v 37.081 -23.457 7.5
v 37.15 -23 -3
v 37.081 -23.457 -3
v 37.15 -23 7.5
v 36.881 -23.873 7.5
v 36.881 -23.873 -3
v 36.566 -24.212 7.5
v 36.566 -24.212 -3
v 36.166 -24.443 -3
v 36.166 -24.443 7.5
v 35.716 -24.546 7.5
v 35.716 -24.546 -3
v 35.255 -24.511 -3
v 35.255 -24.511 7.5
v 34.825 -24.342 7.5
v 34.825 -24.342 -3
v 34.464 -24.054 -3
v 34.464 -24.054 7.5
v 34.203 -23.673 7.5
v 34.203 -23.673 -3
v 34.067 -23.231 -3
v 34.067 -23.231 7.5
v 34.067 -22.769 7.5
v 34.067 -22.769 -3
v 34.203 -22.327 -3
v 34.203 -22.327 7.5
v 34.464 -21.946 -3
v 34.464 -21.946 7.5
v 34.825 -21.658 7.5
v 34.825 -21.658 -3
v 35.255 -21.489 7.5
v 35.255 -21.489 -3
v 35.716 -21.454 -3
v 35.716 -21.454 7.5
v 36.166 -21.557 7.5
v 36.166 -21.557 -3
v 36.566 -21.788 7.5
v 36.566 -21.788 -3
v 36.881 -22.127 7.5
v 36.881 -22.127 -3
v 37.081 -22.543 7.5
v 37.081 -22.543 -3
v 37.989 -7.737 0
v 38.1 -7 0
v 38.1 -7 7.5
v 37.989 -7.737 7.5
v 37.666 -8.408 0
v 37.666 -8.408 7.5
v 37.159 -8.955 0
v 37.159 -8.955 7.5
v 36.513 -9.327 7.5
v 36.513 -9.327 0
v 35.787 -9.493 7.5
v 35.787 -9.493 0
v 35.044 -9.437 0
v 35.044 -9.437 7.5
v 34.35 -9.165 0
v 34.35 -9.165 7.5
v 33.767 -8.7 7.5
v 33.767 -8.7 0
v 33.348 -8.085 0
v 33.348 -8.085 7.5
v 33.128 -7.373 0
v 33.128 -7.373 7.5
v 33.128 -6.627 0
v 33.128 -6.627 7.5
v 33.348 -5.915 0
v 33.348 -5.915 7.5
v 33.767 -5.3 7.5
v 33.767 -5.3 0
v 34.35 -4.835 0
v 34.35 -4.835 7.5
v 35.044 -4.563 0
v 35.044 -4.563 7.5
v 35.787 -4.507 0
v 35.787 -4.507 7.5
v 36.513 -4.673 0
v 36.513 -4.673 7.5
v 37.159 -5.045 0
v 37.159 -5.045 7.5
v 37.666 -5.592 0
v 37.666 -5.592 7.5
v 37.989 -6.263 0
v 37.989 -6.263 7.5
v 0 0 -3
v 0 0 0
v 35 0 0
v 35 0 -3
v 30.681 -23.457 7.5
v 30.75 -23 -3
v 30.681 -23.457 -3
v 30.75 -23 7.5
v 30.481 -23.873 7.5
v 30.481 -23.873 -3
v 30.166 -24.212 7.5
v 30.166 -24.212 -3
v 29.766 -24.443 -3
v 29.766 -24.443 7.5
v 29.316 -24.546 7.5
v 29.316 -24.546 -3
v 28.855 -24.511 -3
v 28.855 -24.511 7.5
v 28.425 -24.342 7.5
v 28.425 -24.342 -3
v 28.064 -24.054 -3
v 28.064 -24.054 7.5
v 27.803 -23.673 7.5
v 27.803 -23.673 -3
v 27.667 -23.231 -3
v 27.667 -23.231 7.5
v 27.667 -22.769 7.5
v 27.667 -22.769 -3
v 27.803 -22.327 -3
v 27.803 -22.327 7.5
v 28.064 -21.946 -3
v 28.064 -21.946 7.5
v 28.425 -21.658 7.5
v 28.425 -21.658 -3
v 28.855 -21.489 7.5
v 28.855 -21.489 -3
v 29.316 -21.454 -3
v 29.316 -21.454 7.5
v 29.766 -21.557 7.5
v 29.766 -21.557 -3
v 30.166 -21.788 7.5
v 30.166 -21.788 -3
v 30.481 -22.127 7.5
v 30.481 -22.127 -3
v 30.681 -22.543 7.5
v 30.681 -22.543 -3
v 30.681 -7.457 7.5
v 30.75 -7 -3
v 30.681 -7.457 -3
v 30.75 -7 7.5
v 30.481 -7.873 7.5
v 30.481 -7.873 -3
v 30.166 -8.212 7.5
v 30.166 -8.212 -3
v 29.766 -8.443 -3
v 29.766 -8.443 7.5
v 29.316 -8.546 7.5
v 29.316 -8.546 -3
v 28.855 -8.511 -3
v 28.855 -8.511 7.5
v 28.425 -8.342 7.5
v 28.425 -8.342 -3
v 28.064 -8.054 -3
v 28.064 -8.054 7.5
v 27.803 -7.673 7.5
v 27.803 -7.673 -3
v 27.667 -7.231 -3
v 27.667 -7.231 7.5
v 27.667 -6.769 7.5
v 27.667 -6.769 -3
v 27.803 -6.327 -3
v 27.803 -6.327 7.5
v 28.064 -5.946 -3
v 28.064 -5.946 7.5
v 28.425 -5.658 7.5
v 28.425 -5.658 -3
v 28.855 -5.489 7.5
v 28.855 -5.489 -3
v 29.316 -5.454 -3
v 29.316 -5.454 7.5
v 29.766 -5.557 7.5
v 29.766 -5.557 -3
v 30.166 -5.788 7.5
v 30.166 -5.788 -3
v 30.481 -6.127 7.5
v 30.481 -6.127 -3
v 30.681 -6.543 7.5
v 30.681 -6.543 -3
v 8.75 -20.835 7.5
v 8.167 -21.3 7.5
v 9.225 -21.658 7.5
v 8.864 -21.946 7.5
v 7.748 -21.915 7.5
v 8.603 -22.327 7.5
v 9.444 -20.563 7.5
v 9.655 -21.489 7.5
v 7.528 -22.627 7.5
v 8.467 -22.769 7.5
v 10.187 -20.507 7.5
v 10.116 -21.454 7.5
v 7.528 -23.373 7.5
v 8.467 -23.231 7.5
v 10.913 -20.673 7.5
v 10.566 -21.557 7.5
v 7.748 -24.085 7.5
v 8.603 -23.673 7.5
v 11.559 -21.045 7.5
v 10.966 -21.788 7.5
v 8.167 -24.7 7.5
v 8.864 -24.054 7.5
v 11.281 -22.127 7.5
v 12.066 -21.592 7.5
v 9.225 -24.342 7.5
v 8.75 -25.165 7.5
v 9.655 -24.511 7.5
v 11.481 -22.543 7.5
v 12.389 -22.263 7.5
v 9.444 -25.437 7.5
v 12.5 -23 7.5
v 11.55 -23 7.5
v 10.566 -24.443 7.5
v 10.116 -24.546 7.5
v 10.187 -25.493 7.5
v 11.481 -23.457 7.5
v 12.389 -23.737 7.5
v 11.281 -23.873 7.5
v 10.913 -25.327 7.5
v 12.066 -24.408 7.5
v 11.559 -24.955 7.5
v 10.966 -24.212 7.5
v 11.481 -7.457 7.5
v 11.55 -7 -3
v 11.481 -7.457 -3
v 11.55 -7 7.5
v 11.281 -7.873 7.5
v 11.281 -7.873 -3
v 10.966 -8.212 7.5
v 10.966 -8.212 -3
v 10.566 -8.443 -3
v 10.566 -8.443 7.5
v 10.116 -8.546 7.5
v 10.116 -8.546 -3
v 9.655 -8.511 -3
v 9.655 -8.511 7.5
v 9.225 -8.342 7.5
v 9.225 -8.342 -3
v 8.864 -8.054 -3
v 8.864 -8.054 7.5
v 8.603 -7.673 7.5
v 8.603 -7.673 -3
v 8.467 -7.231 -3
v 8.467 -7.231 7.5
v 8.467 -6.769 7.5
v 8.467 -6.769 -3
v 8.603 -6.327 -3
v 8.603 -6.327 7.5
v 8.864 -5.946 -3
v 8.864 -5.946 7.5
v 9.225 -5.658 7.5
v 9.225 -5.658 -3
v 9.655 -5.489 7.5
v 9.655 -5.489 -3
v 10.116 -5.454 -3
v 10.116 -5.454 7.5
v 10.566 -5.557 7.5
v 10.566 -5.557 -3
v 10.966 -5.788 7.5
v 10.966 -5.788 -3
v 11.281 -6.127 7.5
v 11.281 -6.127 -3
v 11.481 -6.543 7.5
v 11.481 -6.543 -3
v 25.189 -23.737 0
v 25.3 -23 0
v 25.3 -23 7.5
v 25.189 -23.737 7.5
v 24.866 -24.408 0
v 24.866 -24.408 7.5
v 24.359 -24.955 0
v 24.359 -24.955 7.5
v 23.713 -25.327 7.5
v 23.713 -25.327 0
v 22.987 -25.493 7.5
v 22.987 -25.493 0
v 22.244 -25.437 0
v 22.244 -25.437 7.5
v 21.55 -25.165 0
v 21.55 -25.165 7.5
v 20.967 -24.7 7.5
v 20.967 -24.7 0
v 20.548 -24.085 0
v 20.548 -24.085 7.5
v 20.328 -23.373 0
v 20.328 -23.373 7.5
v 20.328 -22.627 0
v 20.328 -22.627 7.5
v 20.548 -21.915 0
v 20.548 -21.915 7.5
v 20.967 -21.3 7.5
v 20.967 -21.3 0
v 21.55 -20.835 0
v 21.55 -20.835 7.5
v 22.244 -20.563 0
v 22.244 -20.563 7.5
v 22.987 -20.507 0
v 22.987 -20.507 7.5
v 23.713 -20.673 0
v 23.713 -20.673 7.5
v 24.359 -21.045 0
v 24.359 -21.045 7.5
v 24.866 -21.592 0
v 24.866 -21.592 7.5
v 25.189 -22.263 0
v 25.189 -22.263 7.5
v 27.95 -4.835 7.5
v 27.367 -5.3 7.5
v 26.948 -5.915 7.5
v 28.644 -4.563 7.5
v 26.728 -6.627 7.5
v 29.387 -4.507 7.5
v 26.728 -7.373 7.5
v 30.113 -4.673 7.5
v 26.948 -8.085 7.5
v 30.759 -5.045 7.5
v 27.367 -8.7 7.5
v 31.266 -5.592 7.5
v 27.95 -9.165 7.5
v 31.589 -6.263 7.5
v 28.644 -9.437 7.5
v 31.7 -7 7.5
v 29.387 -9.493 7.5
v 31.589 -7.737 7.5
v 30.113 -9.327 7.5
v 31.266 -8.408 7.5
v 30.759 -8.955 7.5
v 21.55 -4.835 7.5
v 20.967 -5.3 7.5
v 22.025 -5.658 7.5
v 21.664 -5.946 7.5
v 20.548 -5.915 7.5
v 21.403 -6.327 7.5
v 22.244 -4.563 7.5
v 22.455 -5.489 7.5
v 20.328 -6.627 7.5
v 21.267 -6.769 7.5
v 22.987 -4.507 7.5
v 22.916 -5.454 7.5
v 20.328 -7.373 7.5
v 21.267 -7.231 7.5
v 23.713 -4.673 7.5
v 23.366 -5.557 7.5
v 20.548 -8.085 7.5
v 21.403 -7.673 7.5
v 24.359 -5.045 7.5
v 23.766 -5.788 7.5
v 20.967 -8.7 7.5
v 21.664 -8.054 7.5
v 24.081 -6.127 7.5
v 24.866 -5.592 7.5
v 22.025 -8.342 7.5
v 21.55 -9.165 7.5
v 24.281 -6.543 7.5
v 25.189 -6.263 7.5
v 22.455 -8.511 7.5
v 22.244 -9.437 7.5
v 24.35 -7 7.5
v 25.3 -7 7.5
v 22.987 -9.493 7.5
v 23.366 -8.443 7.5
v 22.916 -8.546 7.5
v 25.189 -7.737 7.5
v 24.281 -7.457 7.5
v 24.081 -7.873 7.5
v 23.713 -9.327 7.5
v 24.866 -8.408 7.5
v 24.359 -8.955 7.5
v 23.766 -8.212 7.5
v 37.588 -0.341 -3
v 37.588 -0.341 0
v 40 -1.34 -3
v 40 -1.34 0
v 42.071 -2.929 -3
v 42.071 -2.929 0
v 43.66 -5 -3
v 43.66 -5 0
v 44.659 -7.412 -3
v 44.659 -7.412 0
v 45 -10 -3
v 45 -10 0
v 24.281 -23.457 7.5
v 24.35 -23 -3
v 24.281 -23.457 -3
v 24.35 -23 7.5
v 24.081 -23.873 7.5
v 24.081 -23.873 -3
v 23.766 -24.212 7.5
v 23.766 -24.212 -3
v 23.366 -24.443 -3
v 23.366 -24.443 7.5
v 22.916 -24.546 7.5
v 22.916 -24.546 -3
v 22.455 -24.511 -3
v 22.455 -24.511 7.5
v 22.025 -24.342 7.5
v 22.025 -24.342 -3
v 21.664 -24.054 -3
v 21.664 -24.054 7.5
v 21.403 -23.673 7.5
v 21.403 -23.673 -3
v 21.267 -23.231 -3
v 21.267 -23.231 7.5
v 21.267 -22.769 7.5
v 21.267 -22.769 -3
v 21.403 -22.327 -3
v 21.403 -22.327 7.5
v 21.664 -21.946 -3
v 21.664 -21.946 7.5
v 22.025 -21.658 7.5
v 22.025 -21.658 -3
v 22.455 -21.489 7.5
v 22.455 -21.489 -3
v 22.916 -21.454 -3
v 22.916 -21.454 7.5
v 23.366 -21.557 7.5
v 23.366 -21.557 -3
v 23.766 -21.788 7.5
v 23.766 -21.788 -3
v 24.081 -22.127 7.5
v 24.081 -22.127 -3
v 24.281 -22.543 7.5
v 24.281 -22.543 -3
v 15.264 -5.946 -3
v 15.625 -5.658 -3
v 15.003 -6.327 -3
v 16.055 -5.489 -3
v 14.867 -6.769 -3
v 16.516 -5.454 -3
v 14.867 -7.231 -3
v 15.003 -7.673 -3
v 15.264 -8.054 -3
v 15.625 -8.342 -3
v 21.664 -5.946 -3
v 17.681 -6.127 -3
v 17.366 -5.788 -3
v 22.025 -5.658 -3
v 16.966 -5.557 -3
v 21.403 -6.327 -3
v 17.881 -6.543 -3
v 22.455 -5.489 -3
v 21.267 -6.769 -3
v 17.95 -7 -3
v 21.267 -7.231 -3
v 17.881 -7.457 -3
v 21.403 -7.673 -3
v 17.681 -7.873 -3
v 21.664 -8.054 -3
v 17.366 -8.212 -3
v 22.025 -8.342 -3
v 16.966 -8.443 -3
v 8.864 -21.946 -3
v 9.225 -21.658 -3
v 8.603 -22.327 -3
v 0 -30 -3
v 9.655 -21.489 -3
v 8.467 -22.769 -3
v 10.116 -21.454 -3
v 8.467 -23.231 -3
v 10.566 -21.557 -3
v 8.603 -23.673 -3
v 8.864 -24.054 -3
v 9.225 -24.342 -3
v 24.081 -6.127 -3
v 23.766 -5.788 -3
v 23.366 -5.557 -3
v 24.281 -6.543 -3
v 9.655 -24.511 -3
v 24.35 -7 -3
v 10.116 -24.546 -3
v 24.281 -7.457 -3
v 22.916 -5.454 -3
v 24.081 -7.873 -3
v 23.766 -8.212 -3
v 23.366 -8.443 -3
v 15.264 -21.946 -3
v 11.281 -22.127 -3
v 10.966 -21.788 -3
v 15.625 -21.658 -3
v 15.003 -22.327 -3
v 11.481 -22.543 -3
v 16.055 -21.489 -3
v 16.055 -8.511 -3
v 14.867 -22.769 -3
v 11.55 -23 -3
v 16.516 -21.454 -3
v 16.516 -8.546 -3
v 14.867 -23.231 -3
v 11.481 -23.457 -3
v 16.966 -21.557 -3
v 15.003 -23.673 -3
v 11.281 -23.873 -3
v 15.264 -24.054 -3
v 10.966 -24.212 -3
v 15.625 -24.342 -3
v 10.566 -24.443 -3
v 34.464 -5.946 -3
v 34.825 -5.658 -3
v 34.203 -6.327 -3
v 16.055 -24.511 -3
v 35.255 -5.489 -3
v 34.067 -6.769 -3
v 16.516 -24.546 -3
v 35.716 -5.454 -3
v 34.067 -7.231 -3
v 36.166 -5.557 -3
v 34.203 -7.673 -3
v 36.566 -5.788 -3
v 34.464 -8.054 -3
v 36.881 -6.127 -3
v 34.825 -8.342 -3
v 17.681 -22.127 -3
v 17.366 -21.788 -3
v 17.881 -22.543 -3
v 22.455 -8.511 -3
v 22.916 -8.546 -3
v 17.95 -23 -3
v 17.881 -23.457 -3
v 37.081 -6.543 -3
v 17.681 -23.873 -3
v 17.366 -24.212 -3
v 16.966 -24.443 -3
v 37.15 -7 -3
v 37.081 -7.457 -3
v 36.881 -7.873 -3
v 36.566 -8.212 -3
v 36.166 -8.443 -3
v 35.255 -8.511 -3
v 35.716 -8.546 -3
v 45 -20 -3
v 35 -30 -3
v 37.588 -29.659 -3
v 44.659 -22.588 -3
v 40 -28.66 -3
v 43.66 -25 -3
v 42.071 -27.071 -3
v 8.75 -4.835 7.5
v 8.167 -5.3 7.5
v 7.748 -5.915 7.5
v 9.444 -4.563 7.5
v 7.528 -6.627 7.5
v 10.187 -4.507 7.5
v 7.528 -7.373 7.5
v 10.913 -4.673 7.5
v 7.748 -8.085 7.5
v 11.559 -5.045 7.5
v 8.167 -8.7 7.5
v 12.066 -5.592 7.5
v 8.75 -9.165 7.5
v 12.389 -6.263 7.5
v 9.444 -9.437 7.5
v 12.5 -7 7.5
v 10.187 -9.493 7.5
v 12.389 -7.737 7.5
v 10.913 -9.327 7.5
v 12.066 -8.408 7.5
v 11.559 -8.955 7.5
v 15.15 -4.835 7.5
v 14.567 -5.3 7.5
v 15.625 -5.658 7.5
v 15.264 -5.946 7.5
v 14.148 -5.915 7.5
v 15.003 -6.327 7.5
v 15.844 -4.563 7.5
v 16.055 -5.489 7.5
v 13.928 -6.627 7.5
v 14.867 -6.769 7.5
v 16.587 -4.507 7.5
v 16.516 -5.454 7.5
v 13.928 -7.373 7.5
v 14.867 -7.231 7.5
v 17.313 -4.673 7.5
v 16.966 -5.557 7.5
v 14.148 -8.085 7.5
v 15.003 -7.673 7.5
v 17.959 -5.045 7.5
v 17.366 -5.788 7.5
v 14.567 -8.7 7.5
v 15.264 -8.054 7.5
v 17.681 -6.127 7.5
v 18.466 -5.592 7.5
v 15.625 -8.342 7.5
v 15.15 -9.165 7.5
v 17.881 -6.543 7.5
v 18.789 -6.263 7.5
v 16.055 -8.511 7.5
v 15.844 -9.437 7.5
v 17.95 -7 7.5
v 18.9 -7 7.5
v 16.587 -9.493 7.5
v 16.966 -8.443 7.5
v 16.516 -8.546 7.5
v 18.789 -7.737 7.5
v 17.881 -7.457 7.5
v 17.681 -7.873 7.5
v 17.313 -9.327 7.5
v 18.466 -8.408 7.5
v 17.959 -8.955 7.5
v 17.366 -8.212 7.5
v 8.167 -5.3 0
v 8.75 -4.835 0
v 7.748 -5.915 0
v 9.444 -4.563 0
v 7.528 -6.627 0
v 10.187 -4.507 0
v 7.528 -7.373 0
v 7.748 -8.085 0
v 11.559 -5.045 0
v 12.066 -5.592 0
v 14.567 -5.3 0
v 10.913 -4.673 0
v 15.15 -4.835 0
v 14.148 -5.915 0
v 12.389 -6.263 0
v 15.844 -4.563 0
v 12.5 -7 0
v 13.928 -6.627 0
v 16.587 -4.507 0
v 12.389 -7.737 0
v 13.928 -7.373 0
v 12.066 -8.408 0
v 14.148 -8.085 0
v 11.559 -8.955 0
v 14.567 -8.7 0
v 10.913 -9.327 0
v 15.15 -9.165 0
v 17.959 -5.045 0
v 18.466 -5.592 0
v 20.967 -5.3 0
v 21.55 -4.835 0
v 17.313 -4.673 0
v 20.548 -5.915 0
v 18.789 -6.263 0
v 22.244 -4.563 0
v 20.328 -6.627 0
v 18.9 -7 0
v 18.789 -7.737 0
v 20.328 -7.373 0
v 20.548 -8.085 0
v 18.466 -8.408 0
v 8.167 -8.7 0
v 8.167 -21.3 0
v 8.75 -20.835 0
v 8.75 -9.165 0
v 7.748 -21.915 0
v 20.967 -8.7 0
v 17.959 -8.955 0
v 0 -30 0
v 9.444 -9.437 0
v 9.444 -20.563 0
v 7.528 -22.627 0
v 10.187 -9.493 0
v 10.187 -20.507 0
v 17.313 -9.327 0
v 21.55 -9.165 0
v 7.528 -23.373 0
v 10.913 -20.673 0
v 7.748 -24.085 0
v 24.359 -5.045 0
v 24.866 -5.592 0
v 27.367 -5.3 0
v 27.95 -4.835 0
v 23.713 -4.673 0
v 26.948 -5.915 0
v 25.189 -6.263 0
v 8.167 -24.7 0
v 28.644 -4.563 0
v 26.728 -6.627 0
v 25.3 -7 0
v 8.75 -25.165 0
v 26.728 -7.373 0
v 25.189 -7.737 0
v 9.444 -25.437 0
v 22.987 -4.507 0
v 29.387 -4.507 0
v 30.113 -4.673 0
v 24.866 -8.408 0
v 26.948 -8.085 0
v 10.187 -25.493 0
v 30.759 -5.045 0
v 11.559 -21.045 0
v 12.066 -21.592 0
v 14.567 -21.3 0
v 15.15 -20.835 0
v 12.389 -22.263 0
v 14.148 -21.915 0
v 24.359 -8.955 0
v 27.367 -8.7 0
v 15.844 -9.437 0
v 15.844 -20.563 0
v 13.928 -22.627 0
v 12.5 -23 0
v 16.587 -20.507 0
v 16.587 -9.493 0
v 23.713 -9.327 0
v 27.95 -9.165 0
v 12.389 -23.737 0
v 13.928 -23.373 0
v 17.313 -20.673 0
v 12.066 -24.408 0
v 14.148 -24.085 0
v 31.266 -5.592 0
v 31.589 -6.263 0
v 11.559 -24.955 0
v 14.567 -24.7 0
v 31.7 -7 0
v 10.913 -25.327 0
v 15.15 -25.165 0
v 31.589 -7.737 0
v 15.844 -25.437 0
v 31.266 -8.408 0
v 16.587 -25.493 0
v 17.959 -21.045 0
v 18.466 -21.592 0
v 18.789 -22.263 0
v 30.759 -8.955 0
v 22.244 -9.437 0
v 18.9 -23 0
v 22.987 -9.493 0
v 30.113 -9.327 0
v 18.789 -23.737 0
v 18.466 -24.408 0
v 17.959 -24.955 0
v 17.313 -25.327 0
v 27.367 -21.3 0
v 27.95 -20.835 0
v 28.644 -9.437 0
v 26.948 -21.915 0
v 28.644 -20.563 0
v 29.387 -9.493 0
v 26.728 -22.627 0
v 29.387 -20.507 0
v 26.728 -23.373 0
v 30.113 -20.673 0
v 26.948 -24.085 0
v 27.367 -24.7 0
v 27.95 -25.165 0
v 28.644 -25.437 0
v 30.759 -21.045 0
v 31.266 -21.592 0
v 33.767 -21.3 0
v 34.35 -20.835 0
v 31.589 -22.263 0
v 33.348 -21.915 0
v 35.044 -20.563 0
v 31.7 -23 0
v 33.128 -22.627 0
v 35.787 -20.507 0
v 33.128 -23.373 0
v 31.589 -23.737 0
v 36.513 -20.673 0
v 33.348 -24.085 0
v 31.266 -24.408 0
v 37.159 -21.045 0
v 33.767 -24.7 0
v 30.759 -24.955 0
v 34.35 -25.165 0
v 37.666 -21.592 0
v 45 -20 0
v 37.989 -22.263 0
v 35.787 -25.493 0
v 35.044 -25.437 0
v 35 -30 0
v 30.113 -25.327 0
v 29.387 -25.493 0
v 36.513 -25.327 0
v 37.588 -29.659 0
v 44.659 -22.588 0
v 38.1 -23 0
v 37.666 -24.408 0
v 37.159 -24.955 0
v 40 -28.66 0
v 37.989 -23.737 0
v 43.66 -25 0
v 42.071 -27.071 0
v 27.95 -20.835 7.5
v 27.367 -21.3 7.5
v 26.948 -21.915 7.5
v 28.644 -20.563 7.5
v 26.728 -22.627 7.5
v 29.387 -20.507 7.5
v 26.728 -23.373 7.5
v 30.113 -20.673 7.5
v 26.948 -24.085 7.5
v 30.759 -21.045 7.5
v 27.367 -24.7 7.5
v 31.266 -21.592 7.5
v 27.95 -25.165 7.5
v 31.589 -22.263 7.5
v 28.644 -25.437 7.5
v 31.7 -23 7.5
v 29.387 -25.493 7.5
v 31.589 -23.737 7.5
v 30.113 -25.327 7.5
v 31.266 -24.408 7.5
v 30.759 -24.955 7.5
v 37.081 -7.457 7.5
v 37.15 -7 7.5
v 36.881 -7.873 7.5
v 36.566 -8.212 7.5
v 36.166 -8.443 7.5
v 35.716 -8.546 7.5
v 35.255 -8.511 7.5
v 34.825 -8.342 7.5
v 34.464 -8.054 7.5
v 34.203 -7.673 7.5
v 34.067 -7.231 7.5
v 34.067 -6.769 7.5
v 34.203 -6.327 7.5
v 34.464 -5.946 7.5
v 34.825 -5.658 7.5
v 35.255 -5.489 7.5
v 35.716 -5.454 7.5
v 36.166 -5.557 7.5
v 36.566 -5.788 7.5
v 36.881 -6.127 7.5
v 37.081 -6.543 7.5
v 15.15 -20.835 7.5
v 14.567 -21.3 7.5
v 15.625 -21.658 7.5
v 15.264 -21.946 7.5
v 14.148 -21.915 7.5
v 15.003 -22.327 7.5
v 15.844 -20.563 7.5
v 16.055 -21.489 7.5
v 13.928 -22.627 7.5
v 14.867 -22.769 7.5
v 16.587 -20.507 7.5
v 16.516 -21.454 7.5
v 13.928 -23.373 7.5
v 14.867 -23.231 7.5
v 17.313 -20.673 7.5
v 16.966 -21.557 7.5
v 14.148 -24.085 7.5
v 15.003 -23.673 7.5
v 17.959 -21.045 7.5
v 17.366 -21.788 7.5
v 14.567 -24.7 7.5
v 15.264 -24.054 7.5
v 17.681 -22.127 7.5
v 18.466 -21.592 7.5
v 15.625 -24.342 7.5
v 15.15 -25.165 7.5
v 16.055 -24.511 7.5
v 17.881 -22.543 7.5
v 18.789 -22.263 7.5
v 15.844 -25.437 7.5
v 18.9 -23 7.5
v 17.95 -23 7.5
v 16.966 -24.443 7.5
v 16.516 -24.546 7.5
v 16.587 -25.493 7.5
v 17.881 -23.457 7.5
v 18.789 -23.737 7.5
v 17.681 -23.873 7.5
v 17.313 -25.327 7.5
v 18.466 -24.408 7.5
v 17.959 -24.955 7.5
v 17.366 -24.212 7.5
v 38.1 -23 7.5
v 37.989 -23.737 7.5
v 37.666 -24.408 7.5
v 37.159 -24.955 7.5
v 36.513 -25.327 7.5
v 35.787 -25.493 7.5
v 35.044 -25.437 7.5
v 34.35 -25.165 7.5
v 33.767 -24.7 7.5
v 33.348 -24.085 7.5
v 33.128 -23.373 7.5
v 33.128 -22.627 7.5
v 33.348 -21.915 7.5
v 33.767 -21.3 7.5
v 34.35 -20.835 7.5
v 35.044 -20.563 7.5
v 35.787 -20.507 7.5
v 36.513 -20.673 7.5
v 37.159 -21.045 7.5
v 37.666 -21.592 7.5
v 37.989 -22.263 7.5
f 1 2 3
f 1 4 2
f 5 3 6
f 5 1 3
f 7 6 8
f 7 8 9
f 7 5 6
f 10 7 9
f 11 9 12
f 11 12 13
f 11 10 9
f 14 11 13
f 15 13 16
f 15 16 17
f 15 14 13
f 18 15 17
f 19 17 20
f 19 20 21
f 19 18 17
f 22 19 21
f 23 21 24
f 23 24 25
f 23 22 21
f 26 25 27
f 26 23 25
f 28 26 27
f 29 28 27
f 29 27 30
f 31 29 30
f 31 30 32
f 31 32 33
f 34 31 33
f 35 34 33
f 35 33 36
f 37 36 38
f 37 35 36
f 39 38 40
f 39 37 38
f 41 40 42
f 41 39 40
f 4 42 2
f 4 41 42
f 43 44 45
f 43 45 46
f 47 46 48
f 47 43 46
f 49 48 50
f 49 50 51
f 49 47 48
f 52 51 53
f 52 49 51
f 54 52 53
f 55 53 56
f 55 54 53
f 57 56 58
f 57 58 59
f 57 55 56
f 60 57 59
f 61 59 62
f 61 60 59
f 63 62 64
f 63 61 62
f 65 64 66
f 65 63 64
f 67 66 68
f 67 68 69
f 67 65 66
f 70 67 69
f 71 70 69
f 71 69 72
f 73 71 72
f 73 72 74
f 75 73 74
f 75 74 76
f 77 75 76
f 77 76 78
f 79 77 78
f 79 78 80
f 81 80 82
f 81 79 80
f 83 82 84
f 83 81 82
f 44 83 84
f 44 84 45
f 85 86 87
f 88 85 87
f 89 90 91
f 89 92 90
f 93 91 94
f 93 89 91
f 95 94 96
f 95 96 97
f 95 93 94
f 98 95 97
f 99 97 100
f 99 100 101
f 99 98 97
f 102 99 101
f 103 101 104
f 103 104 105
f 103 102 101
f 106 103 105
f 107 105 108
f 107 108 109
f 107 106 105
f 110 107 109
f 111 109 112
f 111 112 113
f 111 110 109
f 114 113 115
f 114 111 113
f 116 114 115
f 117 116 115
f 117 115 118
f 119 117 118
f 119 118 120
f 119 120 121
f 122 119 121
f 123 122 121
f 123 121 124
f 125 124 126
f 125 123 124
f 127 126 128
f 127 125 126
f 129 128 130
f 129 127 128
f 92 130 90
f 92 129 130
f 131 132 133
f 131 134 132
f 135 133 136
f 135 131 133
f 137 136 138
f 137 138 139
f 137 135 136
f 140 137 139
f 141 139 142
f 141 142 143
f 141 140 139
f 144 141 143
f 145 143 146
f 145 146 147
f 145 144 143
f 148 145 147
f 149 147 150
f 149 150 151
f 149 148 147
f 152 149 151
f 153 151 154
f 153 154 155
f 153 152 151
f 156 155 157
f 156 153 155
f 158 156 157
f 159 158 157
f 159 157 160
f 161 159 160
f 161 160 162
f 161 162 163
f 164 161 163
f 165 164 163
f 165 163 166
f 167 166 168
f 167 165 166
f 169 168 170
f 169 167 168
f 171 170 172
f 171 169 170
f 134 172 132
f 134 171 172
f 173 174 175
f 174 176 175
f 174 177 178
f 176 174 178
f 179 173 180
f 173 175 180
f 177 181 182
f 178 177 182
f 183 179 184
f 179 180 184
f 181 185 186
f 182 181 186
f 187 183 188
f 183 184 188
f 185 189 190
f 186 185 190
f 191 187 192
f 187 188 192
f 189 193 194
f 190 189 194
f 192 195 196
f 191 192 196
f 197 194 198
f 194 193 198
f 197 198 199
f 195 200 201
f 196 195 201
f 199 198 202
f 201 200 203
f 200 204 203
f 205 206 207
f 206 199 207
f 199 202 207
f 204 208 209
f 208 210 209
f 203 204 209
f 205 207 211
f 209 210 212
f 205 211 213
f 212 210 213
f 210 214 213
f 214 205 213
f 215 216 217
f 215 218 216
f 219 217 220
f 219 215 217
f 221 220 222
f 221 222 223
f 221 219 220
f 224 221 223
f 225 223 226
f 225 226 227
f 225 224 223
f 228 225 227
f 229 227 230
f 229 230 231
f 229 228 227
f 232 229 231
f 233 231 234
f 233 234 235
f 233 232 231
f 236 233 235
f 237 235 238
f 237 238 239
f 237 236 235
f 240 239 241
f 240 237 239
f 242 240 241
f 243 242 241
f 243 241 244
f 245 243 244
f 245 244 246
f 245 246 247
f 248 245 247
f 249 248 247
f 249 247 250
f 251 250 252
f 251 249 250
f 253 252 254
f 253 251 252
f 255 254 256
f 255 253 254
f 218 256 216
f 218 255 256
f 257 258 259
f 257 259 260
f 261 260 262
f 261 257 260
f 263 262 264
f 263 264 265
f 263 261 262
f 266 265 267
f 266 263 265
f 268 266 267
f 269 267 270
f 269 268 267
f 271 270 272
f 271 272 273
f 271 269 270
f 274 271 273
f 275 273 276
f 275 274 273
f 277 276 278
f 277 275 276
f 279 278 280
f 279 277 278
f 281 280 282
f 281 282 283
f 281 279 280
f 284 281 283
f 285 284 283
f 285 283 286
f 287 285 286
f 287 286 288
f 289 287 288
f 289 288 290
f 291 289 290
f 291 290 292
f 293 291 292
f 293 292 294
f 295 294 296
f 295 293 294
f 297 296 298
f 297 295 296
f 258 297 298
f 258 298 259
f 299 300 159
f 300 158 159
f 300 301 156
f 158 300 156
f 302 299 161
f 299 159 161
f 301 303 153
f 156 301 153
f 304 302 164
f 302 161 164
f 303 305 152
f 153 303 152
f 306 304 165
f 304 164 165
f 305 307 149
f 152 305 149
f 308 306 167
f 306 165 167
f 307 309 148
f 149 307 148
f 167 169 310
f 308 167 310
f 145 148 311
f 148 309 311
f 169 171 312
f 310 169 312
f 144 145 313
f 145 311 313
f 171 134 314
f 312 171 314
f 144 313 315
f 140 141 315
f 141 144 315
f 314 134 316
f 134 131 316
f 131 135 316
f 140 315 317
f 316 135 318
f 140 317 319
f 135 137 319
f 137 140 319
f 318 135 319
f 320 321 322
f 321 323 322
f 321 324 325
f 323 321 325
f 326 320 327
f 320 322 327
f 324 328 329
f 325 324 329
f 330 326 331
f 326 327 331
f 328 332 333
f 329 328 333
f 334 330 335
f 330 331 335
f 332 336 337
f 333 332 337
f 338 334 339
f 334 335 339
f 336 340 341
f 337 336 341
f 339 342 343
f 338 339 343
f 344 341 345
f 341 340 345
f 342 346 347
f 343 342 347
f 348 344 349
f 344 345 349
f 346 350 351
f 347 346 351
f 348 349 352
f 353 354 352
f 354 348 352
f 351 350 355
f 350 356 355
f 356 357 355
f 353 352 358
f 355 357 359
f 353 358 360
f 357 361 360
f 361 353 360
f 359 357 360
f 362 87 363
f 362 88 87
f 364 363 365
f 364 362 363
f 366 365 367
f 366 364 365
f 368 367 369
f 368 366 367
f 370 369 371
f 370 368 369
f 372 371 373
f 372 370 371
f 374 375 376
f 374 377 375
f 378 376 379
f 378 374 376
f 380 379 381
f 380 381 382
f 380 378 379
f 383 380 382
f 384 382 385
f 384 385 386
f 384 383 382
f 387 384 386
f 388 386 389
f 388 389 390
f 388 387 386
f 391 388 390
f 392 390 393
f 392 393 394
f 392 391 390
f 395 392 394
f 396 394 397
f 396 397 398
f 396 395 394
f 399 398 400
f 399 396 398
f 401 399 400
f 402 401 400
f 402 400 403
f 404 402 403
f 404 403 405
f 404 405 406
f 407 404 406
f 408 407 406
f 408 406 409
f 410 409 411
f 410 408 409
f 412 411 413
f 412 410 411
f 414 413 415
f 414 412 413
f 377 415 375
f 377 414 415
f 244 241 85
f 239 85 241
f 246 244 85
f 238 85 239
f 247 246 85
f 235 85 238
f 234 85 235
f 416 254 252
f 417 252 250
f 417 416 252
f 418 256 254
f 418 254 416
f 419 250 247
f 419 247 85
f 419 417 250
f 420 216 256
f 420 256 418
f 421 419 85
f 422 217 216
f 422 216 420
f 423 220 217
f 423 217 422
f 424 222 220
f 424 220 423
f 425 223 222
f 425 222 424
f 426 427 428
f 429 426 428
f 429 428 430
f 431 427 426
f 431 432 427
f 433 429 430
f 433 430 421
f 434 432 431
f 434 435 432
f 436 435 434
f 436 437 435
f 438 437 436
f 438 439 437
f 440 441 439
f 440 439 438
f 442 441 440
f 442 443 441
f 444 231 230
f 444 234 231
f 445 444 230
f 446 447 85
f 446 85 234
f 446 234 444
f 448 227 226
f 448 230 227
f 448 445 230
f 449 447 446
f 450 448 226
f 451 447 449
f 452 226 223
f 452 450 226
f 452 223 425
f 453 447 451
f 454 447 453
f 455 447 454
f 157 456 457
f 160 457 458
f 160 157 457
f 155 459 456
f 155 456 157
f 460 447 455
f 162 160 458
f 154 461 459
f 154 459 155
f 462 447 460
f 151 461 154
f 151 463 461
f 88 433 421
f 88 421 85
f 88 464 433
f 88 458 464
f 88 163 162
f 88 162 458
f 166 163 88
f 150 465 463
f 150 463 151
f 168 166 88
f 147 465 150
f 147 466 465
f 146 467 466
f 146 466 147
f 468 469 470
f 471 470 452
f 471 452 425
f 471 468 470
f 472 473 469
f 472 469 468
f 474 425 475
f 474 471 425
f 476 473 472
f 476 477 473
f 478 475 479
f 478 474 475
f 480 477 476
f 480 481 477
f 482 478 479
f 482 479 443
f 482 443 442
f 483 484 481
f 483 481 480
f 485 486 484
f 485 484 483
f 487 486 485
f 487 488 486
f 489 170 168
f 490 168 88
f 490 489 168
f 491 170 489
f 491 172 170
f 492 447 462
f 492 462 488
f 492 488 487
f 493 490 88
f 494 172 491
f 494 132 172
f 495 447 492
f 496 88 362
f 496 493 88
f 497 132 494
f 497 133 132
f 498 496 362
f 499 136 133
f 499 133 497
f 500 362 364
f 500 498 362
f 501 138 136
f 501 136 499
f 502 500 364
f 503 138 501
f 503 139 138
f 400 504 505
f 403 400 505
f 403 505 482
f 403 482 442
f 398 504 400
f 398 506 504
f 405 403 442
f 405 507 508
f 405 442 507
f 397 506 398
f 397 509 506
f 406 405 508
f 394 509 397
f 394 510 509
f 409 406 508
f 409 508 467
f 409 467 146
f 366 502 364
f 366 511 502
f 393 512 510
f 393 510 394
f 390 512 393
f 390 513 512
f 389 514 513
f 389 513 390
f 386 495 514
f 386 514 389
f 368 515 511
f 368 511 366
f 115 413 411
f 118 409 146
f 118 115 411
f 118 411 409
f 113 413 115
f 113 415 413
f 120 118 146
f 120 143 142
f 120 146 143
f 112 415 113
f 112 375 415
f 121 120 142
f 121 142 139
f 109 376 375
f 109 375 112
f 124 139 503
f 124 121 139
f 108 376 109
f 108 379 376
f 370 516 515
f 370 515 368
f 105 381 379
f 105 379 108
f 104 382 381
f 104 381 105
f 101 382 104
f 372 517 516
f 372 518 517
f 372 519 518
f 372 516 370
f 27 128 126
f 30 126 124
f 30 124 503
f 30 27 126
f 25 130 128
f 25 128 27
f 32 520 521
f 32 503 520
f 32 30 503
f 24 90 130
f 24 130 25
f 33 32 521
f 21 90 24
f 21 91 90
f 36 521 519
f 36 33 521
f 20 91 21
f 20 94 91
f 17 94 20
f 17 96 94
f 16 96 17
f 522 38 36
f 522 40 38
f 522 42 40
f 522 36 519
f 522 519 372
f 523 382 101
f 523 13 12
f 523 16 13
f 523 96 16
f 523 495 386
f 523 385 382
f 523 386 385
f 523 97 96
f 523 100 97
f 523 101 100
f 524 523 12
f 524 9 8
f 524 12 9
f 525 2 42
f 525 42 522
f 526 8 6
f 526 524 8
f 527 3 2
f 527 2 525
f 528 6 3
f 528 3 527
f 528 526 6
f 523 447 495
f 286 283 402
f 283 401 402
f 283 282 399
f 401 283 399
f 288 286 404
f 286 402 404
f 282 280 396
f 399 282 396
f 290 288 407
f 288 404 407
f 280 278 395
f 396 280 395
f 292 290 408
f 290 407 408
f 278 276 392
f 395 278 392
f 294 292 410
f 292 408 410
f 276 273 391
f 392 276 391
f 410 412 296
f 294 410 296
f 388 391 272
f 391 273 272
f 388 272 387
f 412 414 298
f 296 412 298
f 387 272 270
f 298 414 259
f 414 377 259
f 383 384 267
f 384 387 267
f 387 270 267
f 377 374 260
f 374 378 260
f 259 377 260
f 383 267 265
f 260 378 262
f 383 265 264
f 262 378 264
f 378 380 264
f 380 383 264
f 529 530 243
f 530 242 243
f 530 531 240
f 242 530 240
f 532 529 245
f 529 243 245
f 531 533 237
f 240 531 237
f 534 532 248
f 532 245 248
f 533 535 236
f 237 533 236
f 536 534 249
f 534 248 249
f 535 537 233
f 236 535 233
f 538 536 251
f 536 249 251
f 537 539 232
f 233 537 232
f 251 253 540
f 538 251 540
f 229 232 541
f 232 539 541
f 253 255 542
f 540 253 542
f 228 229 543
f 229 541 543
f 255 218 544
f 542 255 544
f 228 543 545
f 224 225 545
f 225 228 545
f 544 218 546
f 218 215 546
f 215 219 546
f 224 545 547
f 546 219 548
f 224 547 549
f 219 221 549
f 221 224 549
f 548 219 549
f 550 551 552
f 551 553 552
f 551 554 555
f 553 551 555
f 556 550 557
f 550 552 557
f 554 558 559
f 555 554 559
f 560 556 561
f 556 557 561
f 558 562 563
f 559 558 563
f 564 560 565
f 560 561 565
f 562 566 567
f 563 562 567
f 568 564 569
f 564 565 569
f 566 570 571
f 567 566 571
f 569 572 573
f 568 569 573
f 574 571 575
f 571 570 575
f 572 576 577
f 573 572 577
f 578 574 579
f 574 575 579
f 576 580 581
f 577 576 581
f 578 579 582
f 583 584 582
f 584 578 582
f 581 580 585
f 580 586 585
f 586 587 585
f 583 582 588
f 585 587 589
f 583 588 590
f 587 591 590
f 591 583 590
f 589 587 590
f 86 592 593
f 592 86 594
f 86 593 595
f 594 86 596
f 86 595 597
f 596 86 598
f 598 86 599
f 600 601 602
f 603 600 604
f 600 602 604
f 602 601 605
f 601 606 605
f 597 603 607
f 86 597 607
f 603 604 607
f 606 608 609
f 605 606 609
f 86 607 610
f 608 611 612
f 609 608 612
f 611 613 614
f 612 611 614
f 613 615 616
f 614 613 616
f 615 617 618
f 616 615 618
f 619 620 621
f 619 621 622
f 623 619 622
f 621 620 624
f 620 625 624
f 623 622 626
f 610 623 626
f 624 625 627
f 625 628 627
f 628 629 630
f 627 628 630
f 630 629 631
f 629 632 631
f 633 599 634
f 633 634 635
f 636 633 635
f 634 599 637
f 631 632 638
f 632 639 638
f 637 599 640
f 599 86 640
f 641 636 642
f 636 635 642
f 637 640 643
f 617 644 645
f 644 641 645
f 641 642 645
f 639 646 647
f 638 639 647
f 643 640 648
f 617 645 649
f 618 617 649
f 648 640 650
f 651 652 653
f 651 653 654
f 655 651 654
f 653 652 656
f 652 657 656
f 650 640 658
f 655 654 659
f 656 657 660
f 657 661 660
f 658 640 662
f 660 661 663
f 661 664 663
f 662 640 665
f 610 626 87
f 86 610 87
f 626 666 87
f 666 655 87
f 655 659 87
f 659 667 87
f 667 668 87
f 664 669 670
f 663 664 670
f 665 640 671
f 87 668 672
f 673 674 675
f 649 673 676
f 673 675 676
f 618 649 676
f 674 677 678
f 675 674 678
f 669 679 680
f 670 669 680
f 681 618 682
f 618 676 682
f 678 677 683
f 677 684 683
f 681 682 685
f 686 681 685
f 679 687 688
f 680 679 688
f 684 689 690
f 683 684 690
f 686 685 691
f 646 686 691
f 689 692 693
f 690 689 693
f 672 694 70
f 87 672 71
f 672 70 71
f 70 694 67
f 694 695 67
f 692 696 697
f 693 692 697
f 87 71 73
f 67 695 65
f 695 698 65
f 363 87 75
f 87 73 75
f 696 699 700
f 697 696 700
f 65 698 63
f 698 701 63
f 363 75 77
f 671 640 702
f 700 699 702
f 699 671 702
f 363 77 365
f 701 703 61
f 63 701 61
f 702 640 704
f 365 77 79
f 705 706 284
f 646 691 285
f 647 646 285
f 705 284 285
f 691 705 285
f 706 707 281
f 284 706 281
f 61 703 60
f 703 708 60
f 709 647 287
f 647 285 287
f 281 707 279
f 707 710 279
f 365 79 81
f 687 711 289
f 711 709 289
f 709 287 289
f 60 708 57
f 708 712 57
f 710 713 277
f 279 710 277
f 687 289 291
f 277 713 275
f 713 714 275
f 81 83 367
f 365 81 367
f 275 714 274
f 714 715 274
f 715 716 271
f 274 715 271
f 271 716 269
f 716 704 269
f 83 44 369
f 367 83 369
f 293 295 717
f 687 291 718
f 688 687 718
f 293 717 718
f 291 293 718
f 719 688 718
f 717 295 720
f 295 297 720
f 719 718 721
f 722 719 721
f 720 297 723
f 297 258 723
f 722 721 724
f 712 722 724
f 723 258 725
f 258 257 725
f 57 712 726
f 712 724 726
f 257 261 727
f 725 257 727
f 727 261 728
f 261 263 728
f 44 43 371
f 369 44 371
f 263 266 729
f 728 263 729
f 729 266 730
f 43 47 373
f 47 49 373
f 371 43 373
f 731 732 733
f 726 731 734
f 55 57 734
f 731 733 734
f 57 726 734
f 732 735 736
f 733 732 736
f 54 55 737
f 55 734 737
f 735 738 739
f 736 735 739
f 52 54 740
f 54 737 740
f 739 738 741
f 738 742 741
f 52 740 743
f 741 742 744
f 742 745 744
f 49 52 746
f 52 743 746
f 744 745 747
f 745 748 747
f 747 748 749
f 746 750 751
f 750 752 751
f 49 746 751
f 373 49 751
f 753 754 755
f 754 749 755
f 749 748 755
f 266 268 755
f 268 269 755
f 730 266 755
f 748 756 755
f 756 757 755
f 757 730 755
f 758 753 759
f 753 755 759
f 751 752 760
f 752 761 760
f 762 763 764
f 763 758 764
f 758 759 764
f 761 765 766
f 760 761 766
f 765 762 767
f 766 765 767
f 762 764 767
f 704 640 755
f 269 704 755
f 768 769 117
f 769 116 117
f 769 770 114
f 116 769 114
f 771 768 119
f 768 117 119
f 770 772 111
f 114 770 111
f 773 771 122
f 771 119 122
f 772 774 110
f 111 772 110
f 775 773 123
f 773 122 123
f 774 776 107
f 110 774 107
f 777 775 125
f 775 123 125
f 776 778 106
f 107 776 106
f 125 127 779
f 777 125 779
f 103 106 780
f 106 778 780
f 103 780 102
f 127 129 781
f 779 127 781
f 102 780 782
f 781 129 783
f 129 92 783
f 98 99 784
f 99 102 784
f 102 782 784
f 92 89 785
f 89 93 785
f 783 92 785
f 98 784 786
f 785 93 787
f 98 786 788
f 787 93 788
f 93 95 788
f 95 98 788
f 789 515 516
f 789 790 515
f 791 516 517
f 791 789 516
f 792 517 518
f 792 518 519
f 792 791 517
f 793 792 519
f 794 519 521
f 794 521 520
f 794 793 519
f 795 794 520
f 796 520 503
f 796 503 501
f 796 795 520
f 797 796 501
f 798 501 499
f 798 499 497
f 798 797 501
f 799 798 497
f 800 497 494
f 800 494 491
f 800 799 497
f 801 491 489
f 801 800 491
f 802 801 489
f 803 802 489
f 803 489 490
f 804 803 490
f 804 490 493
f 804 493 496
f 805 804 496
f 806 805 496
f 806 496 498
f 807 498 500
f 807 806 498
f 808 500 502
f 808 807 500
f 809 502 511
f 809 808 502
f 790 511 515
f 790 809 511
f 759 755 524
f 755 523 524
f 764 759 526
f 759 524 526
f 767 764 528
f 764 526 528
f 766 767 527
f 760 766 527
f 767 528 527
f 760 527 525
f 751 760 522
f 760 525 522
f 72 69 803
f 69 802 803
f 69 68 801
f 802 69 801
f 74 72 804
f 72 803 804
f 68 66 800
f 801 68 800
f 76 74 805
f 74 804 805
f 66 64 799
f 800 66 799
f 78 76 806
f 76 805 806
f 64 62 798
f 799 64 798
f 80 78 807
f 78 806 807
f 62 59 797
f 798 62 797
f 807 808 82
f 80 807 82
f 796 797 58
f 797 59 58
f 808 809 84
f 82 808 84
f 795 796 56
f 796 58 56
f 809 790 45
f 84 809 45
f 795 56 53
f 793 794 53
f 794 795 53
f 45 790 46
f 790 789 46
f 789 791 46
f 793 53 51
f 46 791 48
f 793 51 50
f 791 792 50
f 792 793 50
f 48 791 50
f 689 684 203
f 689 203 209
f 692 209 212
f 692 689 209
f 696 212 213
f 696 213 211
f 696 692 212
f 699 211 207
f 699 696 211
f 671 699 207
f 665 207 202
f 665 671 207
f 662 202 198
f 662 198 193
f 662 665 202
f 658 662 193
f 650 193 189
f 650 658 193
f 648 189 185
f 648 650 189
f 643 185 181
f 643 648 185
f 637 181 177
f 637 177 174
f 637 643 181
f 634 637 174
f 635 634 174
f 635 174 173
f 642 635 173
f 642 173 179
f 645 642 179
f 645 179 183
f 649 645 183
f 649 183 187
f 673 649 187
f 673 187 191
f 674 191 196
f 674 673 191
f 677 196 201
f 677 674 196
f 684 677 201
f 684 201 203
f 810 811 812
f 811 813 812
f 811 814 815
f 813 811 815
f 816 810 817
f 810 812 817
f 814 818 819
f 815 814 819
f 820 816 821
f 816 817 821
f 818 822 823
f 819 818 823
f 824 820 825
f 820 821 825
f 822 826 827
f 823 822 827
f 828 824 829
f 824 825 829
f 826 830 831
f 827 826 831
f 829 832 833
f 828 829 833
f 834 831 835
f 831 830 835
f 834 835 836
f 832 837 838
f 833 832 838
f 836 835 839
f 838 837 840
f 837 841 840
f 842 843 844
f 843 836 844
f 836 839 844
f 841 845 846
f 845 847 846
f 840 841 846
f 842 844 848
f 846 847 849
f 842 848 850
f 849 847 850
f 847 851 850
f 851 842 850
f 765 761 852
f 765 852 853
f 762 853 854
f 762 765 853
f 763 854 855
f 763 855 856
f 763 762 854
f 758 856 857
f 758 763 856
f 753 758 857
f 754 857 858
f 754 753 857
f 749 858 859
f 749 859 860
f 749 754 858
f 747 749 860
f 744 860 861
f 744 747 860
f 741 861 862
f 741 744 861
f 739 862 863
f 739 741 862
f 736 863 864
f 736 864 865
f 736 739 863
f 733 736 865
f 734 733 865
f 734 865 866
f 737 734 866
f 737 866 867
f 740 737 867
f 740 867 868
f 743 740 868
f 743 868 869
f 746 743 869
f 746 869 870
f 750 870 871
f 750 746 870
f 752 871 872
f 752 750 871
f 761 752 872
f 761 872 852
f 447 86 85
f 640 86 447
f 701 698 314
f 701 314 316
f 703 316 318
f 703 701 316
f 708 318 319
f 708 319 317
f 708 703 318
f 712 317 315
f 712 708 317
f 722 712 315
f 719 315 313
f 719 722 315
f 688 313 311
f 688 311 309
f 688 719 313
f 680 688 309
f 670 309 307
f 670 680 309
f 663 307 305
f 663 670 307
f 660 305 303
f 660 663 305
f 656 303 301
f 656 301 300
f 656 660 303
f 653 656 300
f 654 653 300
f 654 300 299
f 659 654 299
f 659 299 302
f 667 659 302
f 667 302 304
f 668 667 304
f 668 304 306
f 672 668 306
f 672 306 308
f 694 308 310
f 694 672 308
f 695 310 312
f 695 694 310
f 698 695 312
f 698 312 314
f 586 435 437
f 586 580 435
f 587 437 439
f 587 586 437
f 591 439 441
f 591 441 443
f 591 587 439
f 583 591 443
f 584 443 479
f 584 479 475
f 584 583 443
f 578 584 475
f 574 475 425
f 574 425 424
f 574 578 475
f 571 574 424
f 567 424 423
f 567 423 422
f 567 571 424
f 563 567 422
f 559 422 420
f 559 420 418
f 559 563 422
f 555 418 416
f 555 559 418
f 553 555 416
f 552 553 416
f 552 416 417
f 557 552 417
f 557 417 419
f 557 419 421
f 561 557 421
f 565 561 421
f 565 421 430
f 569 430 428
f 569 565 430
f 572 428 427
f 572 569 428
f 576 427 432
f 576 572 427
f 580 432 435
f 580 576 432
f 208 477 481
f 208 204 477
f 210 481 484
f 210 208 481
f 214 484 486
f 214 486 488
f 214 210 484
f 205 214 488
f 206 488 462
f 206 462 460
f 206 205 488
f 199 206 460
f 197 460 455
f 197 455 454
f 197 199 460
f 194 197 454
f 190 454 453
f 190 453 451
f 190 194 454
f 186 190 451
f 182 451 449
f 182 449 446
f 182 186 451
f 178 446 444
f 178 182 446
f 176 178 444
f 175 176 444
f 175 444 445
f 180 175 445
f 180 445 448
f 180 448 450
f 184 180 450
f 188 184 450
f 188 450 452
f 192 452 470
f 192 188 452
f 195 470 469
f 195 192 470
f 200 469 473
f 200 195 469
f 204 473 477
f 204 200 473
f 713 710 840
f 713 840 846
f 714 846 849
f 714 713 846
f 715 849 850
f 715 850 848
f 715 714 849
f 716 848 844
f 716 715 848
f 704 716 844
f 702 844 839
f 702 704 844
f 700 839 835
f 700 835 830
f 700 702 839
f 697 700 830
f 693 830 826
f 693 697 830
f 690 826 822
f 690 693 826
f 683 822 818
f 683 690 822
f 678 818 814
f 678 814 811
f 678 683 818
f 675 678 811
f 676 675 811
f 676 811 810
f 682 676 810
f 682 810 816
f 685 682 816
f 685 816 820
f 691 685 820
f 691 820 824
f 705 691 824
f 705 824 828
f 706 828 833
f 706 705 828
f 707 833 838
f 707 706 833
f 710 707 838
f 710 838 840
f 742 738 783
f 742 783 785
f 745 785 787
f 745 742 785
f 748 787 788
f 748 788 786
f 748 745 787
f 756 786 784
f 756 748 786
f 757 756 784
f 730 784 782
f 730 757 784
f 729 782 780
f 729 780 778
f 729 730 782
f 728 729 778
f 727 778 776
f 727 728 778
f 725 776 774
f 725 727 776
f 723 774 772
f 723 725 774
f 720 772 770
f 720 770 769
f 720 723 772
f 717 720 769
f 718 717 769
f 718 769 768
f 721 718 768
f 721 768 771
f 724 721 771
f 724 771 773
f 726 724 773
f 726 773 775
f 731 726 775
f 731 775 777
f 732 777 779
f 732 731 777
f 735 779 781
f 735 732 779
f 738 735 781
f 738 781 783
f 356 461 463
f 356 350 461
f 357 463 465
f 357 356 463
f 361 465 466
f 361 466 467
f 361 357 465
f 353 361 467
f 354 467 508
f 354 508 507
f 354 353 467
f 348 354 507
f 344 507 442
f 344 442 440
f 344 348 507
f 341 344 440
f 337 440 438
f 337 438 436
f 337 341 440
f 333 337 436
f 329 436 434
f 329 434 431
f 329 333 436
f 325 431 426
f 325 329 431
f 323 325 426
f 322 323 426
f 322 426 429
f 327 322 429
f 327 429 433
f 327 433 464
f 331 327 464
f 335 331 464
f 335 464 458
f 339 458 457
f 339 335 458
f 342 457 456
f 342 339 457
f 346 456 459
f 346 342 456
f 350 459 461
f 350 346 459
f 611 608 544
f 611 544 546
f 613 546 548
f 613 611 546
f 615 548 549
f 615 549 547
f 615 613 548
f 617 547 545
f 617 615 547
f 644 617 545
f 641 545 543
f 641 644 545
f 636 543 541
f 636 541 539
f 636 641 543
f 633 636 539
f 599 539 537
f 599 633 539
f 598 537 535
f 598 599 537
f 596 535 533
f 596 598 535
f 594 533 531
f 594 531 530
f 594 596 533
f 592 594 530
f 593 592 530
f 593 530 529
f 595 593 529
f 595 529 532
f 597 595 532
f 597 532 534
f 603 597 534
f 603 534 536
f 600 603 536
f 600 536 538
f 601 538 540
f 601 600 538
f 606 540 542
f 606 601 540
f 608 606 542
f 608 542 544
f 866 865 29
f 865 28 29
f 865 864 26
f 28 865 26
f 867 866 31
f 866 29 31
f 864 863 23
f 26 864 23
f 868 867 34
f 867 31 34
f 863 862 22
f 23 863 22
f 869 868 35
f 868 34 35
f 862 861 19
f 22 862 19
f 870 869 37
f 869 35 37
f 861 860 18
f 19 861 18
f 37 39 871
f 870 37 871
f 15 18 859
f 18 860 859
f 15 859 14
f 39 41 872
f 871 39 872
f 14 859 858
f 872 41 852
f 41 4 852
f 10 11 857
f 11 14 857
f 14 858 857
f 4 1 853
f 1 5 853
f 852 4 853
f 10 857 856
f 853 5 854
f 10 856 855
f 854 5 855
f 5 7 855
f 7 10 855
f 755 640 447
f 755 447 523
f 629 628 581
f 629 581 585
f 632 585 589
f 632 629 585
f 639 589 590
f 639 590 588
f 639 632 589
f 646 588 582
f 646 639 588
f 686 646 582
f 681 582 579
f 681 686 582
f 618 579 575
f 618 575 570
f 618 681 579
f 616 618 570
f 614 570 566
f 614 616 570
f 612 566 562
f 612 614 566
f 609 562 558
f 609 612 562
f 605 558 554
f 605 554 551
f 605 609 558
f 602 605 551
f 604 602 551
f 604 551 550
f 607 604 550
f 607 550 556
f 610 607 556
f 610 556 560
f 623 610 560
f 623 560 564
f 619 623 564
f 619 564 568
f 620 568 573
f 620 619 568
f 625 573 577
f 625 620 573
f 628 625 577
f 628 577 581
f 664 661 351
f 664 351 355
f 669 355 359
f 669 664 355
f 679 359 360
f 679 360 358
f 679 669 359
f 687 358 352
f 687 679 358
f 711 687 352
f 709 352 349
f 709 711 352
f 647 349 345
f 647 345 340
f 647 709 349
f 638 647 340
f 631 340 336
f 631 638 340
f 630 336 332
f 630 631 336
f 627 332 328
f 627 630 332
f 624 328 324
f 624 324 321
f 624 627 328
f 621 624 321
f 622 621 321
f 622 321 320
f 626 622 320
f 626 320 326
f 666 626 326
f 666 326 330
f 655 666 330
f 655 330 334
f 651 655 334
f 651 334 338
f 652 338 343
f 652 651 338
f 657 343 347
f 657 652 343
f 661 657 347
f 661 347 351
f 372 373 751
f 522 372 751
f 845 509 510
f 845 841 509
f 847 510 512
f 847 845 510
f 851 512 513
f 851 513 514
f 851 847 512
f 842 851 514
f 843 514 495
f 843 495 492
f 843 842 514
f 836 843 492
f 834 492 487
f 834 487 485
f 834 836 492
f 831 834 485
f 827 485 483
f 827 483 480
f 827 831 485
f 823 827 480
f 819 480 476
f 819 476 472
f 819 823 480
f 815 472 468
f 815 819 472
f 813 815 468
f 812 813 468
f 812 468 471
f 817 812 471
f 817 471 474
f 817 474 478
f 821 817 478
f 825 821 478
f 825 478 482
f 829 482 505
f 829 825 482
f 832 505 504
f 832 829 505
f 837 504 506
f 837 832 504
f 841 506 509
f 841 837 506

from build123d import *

# Parameters (mm, degrees)
F0_W     = 45
F0_H     = 30
F0_R     = 2.5
F0_R_2   = 1.55
F1_DEPTH = 3
F2_DEPTH = 7.5
F3_R     = 10
F4_ANGLE = 180


with BuildPart() as f1:
    # F0 (on Top) → F1 (new body)
    with BuildSketch(Plane.XY):
        with Locations((22.5, 15)):
            Rectangle(F0_W, F0_H)
        with Locations((10, 7)):
            Circle(F0_R, mode=Mode.SUBTRACT)
        with Locations((16.4, 7)):
            Circle(F0_R, mode=Mode.SUBTRACT)
        with Locations((22.8, 7)):
            Circle(F0_R, mode=Mode.SUBTRACT)
        with Locations((29.2, 7)):
            Circle(F0_R, mode=Mode.SUBTRACT)
        with Locations((35.6, 7)):
            Circle(F0_R, mode=Mode.SUBTRACT)
        with Locations((10, 23)):
            Circle(F0_R, mode=Mode.SUBTRACT)
        with Locations((16.4, 23)):
            Circle(F0_R, mode=Mode.SUBTRACT)
        with Locations((22.8, 23)):
            Circle(F0_R, mode=Mode.SUBTRACT)
        with Locations((29.2, 23)):
            Circle(F0_R, mode=Mode.SUBTRACT)
        with Locations((35.6, 23)):
            Circle(F0_R, mode=Mode.SUBTRACT)
        with Locations((35.6, 23)):
            Circle(F0_R)
        with Locations((35.6, 23)):
            Circle(F0_R_2, mode=Mode.SUBTRACT)
        with Locations((29.2, 23)):
            Circle(F0_R)
        with Locations((29.2, 23)):
            Circle(F0_R_2, mode=Mode.SUBTRACT)
        with Locations((22.8, 23)):
            Circle(F0_R)
        with Locations((22.8, 23)):
            Circle(F0_R_2, mode=Mode.SUBTRACT)
        with Locations((16.4, 23)):
            Circle(F0_R)
        with Locations((16.4, 23)):
            Circle(F0_R_2, mode=Mode.SUBTRACT)
        with Locations((10, 23)):
            Circle(F0_R)
        with Locations((10, 23)):
            Circle(F0_R_2, mode=Mode.SUBTRACT)
        with Locations((10, 7)):
            Circle(F0_R)
        with Locations((10, 7)):
            Circle(F0_R_2, mode=Mode.SUBTRACT)
        with Locations((16.4, 7)):
            Circle(F0_R)
        with Locations((16.4, 7)):
            Circle(F0_R_2, mode=Mode.SUBTRACT)
        with Locations((22.8, 7)):
            Circle(F0_R)
        with Locations((22.8, 7)):
            Circle(F0_R_2, mode=Mode.SUBTRACT)
        with Locations((29.2, 7)):
            Circle(F0_R)
        with Locations((29.2, 7)):
            Circle(F0_R_2, mode=Mode.SUBTRACT)
        with Locations((35.6, 7)):
            Circle(F0_R)
        with Locations((35.6, 7)):
            Circle(F0_R_2, mode=Mode.SUBTRACT)
    extrude(amount=F1_DEPTH)

    # F0 (on Top) → F2 (join)
    with BuildSketch(Plane.XY):
        with Locations((35.6, 23)):
            Circle(F0_R)
        with Locations((35.6, 23)):
            Circle(F0_R_2, mode=Mode.SUBTRACT)
        with Locations((29.2, 23)):
            Circle(F0_R)
        with Locations((29.2, 23)):
            Circle(F0_R_2, mode=Mode.SUBTRACT)
        with Locations((22.8, 23)):
            Circle(F0_R)
        with Locations((22.8, 23)):
            Circle(F0_R_2, mode=Mode.SUBTRACT)
        with Locations((16.4, 23)):
            Circle(F0_R)
        with Locations((16.4, 23)):
            Circle(F0_R_2, mode=Mode.SUBTRACT)
        with Locations((10, 23)):
            Circle(F0_R)
        with Locations((10, 23)):
            Circle(F0_R_2, mode=Mode.SUBTRACT)
        with Locations((10, 7)):
            Circle(F0_R)
        with Locations((10, 7)):
            Circle(F0_R_2, mode=Mode.SUBTRACT)
        with Locations((16.4, 7)):
            Circle(F0_R)
        with Locations((16.4, 7)):
            Circle(F0_R_2, mode=Mode.SUBTRACT)
        with Locations((22.8, 7)):
            Circle(F0_R)
        with Locations((22.8, 7)):
            Circle(F0_R_2, mode=Mode.SUBTRACT)
        with Locations((29.2, 7)):
            Circle(F0_R)
        with Locations((29.2, 7)):
            Circle(F0_R_2, mode=Mode.SUBTRACT)
        with Locations((35.6, 7)):
            Circle(F0_R)
        with Locations((35.6, 7)):
            Circle(F0_R_2, mode=Mode.SUBTRACT)
    extrude(amount=-F2_DEPTH)

    # F3
    f3_edges = [f1.edges().sort_by_distance(p)[0] for p in [
        (45, 30, 1.5),
        (45, 0, 1.5),
    ]]
    fillet(f3_edges, radius=F3_R)


with BuildPart() as f1_1:
    # F4: moved
    add(f1.part.rotate(Axis((22.5, 0, 0), (1, 0, 0)), F4_ANGLE))


solid = f1_1.part
